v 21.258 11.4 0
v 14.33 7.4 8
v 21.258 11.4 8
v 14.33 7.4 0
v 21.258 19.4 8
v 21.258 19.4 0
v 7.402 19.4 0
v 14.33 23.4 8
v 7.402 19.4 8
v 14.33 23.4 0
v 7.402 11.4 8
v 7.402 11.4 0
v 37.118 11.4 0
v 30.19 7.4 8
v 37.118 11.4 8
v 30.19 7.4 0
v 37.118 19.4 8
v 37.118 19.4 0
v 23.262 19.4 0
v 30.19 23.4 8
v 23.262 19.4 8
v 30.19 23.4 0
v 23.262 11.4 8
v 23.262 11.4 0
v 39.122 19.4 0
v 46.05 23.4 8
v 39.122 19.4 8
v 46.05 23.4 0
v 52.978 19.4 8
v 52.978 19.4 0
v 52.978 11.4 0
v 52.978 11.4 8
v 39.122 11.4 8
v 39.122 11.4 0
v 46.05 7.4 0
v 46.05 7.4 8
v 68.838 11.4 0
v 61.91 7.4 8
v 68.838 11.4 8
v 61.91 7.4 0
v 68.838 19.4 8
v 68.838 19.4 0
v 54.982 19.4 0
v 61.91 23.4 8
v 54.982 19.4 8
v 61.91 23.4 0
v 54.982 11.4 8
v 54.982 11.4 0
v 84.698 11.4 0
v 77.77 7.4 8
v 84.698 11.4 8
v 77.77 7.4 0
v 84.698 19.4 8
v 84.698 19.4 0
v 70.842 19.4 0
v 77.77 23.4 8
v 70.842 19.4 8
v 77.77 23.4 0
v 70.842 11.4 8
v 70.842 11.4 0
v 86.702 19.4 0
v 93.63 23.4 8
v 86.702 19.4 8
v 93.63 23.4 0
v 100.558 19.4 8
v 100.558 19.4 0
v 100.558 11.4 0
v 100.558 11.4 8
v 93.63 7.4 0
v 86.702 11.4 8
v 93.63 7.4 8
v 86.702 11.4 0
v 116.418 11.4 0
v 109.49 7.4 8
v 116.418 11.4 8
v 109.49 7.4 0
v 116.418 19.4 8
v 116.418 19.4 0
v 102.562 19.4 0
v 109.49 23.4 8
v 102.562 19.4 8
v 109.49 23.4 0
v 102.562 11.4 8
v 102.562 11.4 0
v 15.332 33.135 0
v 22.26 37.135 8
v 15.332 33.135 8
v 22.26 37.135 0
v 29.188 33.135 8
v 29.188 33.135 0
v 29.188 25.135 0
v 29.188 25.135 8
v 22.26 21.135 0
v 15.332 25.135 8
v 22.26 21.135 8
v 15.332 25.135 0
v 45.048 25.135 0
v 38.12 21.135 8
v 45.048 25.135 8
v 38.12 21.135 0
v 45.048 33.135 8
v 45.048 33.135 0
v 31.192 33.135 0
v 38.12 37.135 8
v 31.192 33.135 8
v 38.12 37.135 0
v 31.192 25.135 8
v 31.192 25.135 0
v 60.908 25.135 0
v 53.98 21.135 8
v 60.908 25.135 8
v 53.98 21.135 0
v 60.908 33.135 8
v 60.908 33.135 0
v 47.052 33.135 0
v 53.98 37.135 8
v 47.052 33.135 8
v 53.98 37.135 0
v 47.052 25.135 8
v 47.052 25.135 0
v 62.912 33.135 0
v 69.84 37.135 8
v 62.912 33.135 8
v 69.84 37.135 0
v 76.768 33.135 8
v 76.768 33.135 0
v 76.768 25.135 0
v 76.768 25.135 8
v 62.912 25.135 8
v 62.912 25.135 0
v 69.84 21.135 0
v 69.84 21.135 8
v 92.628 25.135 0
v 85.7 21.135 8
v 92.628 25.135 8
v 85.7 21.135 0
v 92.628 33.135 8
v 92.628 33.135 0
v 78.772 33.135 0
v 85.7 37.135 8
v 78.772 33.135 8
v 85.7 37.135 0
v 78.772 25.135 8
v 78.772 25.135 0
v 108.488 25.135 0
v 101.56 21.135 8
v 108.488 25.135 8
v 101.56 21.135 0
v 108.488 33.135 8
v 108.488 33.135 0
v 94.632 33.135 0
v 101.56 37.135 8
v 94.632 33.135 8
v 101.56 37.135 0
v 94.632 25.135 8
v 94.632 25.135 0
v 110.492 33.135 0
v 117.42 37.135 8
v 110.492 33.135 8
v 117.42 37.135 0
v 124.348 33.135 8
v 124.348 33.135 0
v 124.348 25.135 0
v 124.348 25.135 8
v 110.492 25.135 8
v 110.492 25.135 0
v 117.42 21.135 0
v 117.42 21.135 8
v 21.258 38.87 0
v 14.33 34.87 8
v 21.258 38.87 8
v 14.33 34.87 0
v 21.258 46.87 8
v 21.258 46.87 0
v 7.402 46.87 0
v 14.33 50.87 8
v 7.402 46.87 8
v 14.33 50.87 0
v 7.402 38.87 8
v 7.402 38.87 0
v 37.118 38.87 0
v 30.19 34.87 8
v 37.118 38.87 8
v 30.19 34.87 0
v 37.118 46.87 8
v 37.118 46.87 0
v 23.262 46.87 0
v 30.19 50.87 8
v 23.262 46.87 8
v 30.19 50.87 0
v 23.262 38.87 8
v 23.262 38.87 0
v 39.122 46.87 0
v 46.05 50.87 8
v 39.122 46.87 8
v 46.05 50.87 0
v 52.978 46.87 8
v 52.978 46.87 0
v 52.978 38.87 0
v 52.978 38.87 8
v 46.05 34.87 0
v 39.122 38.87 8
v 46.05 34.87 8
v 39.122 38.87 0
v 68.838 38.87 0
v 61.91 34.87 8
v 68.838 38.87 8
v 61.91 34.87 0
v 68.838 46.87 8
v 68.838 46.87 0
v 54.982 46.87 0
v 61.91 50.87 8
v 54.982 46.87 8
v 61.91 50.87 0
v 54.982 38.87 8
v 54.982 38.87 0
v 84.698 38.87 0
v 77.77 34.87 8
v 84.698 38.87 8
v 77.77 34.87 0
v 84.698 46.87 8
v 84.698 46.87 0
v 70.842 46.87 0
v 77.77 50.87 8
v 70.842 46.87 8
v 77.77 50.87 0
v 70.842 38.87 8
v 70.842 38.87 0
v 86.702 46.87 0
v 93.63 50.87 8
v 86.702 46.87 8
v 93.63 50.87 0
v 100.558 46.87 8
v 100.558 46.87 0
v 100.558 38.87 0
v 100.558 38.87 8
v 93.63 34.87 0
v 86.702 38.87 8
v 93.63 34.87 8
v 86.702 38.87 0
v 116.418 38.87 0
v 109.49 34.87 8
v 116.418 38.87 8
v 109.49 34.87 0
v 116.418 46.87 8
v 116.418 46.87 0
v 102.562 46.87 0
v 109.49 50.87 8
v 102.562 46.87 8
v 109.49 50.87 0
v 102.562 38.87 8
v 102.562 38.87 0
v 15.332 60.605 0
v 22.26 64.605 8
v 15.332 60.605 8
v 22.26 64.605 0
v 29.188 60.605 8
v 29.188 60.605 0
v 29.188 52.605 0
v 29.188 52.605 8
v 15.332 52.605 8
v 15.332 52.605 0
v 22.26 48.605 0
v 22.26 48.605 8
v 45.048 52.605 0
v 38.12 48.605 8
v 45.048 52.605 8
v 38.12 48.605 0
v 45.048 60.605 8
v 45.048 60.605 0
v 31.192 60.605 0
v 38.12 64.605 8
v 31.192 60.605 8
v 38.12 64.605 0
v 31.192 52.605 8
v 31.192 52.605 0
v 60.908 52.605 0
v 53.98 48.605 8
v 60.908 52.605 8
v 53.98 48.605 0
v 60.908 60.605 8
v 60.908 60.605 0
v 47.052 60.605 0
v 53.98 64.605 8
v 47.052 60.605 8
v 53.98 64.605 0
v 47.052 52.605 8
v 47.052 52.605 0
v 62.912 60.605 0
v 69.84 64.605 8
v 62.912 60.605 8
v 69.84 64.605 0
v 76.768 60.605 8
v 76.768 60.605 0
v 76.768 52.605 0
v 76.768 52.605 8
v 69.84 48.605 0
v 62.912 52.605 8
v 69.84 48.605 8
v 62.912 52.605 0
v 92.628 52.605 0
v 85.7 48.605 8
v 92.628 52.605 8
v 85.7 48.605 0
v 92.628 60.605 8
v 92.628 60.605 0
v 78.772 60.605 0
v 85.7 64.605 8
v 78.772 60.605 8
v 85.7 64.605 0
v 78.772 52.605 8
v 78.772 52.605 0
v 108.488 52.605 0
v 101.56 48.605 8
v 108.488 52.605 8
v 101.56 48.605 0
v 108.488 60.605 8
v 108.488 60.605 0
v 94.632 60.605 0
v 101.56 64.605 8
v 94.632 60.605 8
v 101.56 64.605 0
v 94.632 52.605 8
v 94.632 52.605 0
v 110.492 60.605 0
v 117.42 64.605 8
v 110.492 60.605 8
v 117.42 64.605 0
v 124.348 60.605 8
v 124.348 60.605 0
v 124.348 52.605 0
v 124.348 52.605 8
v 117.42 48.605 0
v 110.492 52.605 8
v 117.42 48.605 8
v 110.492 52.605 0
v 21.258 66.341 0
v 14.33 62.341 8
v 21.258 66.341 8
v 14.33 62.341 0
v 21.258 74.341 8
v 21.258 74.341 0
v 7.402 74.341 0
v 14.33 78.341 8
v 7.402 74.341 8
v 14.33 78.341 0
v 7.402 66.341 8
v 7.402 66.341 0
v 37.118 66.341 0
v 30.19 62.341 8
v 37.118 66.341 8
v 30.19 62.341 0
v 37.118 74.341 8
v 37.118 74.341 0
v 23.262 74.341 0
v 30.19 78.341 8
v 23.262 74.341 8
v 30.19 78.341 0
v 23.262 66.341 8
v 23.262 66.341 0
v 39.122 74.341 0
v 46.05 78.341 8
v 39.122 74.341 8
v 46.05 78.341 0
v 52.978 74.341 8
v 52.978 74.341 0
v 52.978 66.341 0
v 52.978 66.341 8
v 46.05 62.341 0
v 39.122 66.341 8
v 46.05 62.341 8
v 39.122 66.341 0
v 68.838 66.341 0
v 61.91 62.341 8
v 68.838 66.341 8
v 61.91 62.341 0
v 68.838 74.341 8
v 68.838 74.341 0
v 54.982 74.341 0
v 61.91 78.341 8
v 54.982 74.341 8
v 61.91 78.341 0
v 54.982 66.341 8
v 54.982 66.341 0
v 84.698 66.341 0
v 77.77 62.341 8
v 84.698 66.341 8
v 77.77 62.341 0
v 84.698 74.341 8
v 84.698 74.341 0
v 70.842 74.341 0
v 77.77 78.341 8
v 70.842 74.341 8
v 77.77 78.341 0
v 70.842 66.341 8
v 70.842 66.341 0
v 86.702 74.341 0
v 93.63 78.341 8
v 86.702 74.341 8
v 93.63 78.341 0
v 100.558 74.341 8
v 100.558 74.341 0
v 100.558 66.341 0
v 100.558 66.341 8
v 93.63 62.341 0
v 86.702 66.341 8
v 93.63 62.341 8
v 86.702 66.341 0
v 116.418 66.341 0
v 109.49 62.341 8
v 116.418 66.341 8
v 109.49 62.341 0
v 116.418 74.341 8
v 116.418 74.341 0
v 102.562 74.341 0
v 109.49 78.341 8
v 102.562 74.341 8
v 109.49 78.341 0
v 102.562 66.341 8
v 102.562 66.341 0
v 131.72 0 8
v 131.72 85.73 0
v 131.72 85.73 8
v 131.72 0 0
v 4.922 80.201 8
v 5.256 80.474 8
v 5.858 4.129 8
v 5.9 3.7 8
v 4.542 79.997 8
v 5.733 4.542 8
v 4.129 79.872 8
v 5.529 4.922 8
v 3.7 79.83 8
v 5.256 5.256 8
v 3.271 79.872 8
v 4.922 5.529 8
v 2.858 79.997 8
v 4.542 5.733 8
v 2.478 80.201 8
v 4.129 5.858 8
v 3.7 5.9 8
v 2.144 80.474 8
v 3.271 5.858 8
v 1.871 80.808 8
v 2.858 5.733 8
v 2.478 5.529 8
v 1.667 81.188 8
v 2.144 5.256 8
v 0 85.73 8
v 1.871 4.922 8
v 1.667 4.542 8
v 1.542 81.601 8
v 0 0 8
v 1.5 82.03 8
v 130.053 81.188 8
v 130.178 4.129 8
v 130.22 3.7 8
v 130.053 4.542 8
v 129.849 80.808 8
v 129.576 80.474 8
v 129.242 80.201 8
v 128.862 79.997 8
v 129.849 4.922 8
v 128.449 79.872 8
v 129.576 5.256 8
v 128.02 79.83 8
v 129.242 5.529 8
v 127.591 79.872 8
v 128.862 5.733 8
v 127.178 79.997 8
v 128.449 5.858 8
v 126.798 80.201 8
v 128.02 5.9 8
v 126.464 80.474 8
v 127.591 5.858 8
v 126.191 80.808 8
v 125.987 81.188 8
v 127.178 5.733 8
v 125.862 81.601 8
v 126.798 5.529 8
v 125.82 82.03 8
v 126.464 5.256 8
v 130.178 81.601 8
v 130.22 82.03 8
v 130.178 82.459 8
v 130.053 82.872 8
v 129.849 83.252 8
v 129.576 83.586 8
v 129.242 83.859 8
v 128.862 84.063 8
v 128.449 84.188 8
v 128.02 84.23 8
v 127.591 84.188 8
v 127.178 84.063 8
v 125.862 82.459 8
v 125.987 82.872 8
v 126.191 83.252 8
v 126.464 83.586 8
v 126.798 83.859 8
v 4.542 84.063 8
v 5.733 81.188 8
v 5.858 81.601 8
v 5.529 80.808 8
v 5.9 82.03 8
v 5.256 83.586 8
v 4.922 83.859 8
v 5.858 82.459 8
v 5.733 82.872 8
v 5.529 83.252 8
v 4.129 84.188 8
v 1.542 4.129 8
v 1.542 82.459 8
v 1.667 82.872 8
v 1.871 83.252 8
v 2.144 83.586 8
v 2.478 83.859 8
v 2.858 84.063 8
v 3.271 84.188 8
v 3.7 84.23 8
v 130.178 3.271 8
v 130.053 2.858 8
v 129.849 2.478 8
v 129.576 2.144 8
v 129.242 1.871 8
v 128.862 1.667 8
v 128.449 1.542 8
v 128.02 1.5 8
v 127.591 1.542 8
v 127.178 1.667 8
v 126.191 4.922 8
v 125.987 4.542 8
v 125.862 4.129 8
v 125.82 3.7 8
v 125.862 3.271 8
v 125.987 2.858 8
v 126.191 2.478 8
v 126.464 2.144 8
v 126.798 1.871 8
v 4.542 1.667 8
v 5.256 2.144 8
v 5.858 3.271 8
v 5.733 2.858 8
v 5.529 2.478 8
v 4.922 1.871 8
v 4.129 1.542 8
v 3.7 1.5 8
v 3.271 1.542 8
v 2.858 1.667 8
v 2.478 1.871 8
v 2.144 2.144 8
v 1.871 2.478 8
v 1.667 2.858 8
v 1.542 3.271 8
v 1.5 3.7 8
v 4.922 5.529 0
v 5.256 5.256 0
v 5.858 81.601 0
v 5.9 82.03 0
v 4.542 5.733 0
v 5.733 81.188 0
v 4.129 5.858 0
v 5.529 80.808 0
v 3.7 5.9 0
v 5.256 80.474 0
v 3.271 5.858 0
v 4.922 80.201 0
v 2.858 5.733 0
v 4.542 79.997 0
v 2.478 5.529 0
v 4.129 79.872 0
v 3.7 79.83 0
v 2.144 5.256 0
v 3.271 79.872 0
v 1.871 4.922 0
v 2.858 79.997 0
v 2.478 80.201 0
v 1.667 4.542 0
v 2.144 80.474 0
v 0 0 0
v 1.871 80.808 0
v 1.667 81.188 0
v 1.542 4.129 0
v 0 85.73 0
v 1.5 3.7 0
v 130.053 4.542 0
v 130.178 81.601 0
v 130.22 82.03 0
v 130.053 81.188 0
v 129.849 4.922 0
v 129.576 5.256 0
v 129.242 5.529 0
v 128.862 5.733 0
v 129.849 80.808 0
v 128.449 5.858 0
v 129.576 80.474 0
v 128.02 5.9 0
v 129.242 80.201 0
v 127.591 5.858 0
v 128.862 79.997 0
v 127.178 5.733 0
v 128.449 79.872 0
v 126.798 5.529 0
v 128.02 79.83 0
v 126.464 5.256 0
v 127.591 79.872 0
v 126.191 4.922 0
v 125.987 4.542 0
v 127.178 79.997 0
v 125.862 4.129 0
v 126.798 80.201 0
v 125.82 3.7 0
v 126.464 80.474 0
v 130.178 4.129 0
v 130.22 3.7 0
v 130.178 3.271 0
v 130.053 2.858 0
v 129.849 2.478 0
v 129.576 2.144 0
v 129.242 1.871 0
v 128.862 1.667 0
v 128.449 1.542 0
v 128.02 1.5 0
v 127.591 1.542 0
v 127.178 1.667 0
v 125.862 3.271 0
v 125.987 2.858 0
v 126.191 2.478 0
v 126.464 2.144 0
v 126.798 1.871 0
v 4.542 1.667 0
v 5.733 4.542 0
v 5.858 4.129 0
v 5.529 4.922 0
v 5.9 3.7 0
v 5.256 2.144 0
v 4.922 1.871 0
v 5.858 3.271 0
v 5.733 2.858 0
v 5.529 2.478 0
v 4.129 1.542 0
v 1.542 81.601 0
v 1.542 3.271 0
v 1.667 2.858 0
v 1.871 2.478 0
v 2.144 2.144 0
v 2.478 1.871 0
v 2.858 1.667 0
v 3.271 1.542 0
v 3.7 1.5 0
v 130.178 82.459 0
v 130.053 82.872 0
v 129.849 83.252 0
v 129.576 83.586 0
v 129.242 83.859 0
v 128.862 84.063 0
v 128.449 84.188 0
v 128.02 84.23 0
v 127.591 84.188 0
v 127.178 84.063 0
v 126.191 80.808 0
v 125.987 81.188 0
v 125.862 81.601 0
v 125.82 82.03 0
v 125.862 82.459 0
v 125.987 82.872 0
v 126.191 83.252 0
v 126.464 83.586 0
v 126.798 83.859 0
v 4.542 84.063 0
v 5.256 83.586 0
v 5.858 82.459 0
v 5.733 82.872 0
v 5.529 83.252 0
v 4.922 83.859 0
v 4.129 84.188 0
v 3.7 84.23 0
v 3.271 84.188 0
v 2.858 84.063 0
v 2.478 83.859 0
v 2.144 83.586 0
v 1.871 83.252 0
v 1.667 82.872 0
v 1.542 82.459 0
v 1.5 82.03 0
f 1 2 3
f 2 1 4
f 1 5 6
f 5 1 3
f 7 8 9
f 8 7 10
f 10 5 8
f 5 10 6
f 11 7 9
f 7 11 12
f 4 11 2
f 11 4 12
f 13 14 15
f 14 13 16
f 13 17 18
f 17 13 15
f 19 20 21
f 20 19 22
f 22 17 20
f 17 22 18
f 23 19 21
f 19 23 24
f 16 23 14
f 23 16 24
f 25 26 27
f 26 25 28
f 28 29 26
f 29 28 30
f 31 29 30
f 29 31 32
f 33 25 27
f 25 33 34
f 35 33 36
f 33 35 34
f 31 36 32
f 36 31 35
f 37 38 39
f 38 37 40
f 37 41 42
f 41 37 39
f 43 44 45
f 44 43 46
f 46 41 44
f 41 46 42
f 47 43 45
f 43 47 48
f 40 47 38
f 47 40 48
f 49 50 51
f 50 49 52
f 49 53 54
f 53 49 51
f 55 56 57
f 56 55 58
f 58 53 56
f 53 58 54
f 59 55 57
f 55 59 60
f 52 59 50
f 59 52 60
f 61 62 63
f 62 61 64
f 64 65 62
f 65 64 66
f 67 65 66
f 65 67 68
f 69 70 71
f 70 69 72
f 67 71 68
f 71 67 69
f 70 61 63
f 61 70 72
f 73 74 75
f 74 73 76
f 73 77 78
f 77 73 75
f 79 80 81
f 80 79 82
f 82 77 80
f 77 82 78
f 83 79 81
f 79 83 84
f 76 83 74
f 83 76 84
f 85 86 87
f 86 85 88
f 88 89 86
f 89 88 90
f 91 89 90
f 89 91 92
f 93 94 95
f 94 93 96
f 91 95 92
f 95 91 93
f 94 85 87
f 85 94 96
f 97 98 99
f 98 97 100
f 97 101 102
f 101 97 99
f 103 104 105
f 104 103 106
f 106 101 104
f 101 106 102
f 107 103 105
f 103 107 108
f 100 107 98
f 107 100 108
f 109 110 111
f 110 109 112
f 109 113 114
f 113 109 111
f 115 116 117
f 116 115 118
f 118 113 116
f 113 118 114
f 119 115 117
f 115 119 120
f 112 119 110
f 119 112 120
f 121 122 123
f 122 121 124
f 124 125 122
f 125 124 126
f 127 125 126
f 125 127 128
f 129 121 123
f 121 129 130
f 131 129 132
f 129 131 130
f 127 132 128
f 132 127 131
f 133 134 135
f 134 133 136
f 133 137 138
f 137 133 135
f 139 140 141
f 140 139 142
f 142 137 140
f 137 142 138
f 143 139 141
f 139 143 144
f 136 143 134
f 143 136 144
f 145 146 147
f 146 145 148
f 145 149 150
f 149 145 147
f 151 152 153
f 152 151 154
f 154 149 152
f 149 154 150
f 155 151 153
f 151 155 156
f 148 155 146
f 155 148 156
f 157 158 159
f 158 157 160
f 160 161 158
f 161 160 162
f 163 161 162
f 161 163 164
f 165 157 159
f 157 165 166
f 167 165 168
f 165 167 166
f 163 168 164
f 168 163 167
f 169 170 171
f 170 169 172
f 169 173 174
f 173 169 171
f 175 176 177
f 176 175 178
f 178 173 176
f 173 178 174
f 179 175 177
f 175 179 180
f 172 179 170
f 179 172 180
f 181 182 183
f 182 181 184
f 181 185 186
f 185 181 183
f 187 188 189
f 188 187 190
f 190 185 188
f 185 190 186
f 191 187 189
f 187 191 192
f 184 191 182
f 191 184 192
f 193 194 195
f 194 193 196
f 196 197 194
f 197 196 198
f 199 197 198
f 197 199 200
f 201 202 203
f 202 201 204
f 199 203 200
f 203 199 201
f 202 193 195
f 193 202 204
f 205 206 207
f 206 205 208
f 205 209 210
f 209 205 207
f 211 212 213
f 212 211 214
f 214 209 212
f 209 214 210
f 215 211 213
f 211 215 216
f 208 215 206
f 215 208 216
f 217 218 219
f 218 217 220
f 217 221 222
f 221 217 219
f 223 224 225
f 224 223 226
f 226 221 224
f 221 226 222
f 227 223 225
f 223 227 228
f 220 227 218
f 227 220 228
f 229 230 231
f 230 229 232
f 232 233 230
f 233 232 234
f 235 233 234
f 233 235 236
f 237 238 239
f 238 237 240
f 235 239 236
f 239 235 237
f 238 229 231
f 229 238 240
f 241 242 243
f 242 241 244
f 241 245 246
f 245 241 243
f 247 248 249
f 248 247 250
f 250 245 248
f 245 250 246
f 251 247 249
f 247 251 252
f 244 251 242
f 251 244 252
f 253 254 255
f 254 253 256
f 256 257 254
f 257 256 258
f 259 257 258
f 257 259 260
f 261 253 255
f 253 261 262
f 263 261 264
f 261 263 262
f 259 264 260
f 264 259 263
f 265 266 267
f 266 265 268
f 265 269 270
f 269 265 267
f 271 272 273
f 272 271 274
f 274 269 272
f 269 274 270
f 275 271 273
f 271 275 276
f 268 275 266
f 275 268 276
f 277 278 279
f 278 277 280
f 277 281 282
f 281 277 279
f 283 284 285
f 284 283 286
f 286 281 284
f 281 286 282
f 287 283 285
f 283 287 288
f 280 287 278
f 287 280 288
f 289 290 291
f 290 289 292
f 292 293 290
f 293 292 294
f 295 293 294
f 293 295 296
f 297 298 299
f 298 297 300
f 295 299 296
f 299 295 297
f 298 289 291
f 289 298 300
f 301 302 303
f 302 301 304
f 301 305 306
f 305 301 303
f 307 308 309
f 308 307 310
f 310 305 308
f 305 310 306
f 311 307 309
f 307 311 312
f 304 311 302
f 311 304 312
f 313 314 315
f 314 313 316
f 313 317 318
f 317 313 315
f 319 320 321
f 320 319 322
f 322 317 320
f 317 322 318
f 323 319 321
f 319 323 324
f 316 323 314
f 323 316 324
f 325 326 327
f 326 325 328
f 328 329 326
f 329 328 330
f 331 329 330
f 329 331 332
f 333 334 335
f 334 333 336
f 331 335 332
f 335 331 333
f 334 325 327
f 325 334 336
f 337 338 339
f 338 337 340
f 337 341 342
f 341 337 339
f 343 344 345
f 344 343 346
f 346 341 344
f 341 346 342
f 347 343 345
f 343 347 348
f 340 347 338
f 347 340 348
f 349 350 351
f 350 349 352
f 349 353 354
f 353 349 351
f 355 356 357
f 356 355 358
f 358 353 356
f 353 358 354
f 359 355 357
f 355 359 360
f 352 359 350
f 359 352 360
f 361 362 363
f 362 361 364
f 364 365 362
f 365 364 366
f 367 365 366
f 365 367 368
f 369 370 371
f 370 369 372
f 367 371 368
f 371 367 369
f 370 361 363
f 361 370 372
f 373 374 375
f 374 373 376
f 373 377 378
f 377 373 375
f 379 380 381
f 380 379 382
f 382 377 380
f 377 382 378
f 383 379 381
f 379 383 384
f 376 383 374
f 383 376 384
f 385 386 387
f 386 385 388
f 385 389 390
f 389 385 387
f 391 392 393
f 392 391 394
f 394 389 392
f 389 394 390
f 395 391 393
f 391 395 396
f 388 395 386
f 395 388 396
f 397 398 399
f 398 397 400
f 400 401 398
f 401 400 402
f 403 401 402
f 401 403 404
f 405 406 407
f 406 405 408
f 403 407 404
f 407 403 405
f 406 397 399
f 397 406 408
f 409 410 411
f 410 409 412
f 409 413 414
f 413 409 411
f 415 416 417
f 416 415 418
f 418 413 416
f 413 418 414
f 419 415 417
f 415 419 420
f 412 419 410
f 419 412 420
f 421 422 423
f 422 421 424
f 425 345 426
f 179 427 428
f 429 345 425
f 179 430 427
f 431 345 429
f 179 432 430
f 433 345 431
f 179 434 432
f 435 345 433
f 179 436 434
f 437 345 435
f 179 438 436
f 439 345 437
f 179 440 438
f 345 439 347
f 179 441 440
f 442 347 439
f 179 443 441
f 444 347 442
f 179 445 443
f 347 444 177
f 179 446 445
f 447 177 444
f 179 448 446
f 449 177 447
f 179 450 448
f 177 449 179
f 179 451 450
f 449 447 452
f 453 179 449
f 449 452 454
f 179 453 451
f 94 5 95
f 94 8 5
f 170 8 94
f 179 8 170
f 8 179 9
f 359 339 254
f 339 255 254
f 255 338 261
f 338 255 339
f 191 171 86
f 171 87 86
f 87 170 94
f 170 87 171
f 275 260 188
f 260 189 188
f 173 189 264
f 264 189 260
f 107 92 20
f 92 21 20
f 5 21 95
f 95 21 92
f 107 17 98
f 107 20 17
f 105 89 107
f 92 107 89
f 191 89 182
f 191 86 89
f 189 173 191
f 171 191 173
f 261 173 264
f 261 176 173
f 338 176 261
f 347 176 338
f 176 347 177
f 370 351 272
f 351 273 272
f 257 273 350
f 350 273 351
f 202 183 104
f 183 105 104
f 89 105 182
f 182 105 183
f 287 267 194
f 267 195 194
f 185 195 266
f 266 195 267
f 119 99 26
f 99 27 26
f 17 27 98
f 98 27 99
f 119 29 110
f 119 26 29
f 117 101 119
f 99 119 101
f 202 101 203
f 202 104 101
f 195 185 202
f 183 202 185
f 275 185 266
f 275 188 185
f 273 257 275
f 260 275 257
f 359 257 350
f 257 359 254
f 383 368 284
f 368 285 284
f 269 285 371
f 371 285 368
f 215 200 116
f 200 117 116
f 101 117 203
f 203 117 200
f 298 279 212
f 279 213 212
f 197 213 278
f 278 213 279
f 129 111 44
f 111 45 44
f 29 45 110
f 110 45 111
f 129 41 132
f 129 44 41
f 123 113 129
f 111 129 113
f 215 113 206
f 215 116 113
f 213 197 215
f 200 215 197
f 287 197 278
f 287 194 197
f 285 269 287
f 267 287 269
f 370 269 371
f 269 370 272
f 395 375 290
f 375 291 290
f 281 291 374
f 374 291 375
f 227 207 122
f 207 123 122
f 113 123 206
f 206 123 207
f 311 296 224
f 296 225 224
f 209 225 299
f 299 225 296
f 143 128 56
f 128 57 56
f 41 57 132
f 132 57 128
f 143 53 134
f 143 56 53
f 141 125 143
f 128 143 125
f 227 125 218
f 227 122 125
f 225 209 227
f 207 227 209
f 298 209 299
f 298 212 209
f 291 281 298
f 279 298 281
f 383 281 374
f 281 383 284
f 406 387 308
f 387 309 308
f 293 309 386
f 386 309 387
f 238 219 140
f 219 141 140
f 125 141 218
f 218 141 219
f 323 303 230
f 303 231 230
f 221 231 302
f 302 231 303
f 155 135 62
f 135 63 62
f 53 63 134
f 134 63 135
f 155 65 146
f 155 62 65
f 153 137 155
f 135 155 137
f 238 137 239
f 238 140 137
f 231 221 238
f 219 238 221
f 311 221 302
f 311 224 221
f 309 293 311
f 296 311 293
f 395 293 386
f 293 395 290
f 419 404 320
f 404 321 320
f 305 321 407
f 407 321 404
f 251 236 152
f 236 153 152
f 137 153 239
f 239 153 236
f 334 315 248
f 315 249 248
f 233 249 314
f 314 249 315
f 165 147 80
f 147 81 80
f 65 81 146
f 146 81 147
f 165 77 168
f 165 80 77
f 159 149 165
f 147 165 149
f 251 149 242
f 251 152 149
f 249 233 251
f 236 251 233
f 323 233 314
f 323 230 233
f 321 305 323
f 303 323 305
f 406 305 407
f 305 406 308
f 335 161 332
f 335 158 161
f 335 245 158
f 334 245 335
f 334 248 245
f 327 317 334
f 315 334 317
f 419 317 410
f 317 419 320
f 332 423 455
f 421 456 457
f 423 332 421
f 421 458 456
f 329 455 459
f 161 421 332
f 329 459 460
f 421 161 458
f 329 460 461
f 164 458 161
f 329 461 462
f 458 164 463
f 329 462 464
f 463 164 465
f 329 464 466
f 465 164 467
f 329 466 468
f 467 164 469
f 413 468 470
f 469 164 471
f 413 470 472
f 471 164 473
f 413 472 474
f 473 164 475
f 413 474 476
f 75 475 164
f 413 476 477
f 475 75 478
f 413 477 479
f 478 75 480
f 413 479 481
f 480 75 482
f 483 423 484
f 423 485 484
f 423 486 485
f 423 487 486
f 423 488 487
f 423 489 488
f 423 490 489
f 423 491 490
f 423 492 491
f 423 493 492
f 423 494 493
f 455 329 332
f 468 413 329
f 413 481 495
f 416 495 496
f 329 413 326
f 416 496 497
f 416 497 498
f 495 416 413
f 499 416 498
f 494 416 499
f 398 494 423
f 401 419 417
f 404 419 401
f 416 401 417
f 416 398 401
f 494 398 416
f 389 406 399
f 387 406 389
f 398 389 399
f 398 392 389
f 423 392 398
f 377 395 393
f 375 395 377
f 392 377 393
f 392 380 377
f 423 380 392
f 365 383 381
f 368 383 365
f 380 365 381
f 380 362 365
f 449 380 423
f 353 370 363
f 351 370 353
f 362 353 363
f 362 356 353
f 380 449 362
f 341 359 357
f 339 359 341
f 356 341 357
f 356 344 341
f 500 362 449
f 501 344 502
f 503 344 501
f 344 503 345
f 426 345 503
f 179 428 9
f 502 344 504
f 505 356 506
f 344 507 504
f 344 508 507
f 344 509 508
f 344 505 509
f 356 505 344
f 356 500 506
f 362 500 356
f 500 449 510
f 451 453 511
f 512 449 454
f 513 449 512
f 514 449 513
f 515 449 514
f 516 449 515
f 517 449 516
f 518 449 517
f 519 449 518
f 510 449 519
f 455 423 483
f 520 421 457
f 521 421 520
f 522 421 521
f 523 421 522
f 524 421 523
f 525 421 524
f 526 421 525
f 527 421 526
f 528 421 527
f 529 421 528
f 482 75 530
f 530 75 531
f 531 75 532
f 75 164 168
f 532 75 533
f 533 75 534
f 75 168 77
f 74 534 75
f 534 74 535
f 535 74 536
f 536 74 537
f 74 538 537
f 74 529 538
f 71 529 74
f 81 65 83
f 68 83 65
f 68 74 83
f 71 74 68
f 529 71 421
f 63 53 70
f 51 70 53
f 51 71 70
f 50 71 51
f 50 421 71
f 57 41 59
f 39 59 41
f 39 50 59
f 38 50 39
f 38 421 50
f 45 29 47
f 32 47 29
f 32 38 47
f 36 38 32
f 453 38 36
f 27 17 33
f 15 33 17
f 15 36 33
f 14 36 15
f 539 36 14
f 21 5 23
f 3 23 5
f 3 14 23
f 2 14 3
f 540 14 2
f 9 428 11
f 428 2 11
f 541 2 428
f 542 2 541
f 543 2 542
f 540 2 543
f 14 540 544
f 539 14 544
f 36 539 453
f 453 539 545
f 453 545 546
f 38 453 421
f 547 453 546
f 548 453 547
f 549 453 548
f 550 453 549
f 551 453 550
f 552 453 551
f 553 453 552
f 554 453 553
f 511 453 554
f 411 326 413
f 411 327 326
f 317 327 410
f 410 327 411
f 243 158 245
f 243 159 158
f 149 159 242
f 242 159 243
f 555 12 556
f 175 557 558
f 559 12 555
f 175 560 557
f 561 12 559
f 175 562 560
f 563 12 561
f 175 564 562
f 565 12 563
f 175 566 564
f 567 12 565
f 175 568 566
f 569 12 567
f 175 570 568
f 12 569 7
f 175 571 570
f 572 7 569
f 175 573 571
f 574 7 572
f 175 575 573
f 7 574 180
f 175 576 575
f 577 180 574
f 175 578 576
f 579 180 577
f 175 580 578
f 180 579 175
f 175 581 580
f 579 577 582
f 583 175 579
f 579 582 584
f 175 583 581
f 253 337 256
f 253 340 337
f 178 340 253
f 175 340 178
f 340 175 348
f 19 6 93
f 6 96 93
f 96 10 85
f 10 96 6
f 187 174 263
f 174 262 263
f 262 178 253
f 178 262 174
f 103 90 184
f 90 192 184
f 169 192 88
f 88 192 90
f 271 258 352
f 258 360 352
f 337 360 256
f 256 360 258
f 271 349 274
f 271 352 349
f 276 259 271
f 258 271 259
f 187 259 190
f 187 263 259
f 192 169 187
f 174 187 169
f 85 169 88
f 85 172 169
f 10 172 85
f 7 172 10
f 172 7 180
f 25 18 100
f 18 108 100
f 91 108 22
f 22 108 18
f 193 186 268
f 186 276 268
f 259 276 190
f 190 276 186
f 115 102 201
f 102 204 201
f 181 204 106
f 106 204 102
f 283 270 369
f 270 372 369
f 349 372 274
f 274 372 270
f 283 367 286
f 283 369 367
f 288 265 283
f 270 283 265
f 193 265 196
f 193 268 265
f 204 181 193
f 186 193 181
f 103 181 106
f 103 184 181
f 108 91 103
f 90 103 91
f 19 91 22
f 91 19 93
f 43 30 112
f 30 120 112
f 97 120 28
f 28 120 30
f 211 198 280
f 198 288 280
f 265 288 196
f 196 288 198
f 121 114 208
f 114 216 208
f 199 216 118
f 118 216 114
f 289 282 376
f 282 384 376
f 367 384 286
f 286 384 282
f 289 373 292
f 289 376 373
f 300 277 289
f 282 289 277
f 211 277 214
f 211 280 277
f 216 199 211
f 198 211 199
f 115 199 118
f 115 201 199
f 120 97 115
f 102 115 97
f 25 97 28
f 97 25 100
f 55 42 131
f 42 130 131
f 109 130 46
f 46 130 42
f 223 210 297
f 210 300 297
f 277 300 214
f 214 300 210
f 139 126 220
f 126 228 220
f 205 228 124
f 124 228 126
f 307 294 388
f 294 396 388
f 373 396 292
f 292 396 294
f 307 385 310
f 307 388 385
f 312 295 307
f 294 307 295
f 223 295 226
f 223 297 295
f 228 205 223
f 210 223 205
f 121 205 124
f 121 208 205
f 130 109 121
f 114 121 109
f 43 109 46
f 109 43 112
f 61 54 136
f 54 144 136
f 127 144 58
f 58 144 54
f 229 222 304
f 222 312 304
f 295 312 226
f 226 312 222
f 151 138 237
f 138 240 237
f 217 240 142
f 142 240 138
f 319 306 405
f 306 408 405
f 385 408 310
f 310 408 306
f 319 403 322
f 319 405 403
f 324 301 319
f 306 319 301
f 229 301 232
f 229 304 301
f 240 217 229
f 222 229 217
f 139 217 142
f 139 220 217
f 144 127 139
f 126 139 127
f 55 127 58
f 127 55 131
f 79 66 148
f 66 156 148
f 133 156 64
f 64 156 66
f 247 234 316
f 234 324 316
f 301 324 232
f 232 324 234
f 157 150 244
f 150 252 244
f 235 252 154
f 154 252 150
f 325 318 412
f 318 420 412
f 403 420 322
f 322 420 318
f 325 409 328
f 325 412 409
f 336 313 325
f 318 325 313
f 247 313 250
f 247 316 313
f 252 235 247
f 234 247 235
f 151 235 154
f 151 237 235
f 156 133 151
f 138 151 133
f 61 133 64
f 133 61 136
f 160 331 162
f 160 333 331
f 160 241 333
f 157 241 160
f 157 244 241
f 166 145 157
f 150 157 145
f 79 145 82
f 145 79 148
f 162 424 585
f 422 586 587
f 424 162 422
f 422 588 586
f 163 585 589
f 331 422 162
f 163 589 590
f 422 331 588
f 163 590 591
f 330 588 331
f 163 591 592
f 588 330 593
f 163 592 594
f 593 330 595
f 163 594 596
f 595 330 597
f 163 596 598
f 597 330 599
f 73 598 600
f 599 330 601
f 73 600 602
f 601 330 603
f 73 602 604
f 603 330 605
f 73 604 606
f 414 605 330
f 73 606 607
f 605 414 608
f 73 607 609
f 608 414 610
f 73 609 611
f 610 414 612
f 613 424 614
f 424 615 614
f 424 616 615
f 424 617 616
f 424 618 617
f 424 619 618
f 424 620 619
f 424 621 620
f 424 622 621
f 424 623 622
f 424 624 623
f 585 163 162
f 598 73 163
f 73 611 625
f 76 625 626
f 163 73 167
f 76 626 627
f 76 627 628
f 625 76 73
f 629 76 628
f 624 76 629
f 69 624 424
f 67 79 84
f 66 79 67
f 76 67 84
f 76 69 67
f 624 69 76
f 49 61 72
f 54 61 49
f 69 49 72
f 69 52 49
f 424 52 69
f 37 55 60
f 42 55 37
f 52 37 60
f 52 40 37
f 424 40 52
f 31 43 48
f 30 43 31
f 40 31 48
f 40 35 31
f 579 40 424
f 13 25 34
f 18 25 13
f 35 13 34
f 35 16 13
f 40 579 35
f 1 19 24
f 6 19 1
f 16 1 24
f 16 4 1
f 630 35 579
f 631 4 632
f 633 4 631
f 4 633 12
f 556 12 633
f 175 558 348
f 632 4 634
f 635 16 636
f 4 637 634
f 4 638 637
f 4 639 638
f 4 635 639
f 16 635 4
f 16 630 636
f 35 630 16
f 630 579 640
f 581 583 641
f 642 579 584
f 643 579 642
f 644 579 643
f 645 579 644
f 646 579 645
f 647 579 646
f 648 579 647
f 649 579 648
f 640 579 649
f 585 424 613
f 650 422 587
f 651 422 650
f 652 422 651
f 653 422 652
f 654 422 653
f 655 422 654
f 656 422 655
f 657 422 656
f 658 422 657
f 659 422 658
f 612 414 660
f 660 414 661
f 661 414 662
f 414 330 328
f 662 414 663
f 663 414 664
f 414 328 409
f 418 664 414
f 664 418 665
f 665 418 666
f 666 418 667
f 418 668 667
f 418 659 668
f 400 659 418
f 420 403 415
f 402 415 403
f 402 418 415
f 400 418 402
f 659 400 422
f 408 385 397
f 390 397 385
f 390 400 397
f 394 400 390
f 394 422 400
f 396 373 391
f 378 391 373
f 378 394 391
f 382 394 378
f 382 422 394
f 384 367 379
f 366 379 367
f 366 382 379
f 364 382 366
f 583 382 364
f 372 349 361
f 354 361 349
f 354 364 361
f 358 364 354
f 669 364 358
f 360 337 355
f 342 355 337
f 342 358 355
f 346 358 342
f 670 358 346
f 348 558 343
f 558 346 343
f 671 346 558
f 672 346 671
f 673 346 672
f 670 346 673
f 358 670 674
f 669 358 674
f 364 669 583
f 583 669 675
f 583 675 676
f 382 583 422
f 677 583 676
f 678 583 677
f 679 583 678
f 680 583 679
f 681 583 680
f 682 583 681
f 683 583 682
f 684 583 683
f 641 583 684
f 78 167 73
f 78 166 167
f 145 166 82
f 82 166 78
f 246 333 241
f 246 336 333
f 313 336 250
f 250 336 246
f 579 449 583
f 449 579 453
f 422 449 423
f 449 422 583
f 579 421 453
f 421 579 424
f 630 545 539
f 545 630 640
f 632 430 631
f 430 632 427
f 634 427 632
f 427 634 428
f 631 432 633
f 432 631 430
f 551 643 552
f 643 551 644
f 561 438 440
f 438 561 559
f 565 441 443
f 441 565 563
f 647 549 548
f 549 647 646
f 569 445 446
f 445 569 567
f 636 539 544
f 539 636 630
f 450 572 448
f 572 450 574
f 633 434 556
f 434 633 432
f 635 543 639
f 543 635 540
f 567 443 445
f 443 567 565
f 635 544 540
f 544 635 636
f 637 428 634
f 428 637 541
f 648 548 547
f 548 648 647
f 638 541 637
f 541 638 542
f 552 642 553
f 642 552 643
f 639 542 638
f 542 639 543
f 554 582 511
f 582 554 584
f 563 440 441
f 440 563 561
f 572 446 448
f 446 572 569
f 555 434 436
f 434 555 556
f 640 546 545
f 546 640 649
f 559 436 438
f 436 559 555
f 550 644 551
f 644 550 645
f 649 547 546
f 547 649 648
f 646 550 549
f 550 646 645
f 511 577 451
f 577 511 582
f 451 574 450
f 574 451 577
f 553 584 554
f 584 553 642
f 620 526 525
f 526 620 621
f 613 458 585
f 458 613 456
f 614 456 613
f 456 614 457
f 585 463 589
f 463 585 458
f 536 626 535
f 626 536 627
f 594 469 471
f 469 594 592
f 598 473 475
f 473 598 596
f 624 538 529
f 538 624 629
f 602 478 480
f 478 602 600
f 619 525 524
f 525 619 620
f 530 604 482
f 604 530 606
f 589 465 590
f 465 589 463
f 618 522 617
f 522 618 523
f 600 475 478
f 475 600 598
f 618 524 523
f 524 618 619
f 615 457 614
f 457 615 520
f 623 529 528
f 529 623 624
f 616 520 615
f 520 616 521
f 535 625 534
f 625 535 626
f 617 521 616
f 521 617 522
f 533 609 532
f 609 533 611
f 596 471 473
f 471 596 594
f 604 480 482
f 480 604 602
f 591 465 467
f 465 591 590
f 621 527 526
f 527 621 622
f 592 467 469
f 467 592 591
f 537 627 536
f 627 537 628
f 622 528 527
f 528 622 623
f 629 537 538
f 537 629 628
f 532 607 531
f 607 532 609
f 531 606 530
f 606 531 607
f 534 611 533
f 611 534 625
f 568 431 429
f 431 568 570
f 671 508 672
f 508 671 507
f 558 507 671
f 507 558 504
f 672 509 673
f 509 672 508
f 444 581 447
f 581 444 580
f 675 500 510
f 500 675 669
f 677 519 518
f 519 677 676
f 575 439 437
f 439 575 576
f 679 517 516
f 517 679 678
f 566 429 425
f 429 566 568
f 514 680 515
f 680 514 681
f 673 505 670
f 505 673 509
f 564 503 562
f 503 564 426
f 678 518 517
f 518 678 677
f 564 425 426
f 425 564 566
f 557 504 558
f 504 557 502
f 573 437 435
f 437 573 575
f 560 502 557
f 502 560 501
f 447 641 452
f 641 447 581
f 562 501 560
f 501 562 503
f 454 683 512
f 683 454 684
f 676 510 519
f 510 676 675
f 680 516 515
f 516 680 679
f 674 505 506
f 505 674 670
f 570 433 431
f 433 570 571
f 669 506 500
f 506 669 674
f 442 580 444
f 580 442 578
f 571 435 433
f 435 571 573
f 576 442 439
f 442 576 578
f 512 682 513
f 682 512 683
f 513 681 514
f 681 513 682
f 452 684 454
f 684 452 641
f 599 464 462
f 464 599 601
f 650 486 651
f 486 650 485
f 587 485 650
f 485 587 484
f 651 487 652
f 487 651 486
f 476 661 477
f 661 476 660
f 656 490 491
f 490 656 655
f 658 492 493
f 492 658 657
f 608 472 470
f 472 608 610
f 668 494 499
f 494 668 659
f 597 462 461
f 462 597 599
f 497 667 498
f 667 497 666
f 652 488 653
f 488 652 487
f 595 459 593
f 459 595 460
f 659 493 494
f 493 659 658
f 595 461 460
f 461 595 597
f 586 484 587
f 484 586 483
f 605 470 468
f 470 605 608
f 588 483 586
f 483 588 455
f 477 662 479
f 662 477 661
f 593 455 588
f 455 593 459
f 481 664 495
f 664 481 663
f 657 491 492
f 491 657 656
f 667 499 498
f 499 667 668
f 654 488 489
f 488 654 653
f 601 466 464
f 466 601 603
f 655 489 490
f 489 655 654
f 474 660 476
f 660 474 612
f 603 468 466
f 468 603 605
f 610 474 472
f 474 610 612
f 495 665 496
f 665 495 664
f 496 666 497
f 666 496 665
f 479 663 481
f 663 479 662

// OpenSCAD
$fn = 32;

// ----------------------------------------------------------------------
// Honeycomb panel: 131.72 x 85.73 mm, 35 cells of 16 mm
// ----------------------------------------------------------------------

// --- parameters (mm) ---
panel_w = 131.72;         // panel width
panel_d = 85.73;          // panel depth
thick = 8;                // panel thickness
cell_r = 8;               // hex cell circumradius
pitch = 15.86;            // hex cell pitch (centre to centre)
web = 2;                  // web between the cells
columns = 7;              // columns of cells
rows = 5;                 // rows of cells
cell_count = 35;          // total cells
shift_x = 14.33;          // first cell offset in x
shift_y = 15.4;           // first cell offset in y
mount_d = 4.4;            // corner mounting holes
hole_off = 3.7;           // mounting hole offset from the corners

difference() {
  union() {
    cube([panel_w, panel_d, thick]);
  }
  /* hexagonal cells, point-up, cut right through the plate */
  for (row = [0 : rows - 1]) {
    for (col = [0 : columns - 1]) {
      translate([shift_x + col * pitch + (row % 2) * pitch / 2, shift_y + row * pitch * 0.866025, -2.5]) rotate([0, 0, 30]) cylinder(h = thick + 5, d = 2 * cell_r, $fn = 6);
    }
  }
  /* corner mounting holes, clear of the outer cell web */
  translate([3.7, 3.7, -2.5]) cylinder(h = thick + 5, d = mount_d);
  translate([128.02, 3.7, -2.5]) cylinder(h = thick + 5, d = mount_d);
  translate([3.7, 82.03, -2.5]) cylinder(h = thick + 5, d = mount_d);
  translate([128.02, 82.03, -2.5]) cylinder(h = thick + 5, d = mount_d);
}
